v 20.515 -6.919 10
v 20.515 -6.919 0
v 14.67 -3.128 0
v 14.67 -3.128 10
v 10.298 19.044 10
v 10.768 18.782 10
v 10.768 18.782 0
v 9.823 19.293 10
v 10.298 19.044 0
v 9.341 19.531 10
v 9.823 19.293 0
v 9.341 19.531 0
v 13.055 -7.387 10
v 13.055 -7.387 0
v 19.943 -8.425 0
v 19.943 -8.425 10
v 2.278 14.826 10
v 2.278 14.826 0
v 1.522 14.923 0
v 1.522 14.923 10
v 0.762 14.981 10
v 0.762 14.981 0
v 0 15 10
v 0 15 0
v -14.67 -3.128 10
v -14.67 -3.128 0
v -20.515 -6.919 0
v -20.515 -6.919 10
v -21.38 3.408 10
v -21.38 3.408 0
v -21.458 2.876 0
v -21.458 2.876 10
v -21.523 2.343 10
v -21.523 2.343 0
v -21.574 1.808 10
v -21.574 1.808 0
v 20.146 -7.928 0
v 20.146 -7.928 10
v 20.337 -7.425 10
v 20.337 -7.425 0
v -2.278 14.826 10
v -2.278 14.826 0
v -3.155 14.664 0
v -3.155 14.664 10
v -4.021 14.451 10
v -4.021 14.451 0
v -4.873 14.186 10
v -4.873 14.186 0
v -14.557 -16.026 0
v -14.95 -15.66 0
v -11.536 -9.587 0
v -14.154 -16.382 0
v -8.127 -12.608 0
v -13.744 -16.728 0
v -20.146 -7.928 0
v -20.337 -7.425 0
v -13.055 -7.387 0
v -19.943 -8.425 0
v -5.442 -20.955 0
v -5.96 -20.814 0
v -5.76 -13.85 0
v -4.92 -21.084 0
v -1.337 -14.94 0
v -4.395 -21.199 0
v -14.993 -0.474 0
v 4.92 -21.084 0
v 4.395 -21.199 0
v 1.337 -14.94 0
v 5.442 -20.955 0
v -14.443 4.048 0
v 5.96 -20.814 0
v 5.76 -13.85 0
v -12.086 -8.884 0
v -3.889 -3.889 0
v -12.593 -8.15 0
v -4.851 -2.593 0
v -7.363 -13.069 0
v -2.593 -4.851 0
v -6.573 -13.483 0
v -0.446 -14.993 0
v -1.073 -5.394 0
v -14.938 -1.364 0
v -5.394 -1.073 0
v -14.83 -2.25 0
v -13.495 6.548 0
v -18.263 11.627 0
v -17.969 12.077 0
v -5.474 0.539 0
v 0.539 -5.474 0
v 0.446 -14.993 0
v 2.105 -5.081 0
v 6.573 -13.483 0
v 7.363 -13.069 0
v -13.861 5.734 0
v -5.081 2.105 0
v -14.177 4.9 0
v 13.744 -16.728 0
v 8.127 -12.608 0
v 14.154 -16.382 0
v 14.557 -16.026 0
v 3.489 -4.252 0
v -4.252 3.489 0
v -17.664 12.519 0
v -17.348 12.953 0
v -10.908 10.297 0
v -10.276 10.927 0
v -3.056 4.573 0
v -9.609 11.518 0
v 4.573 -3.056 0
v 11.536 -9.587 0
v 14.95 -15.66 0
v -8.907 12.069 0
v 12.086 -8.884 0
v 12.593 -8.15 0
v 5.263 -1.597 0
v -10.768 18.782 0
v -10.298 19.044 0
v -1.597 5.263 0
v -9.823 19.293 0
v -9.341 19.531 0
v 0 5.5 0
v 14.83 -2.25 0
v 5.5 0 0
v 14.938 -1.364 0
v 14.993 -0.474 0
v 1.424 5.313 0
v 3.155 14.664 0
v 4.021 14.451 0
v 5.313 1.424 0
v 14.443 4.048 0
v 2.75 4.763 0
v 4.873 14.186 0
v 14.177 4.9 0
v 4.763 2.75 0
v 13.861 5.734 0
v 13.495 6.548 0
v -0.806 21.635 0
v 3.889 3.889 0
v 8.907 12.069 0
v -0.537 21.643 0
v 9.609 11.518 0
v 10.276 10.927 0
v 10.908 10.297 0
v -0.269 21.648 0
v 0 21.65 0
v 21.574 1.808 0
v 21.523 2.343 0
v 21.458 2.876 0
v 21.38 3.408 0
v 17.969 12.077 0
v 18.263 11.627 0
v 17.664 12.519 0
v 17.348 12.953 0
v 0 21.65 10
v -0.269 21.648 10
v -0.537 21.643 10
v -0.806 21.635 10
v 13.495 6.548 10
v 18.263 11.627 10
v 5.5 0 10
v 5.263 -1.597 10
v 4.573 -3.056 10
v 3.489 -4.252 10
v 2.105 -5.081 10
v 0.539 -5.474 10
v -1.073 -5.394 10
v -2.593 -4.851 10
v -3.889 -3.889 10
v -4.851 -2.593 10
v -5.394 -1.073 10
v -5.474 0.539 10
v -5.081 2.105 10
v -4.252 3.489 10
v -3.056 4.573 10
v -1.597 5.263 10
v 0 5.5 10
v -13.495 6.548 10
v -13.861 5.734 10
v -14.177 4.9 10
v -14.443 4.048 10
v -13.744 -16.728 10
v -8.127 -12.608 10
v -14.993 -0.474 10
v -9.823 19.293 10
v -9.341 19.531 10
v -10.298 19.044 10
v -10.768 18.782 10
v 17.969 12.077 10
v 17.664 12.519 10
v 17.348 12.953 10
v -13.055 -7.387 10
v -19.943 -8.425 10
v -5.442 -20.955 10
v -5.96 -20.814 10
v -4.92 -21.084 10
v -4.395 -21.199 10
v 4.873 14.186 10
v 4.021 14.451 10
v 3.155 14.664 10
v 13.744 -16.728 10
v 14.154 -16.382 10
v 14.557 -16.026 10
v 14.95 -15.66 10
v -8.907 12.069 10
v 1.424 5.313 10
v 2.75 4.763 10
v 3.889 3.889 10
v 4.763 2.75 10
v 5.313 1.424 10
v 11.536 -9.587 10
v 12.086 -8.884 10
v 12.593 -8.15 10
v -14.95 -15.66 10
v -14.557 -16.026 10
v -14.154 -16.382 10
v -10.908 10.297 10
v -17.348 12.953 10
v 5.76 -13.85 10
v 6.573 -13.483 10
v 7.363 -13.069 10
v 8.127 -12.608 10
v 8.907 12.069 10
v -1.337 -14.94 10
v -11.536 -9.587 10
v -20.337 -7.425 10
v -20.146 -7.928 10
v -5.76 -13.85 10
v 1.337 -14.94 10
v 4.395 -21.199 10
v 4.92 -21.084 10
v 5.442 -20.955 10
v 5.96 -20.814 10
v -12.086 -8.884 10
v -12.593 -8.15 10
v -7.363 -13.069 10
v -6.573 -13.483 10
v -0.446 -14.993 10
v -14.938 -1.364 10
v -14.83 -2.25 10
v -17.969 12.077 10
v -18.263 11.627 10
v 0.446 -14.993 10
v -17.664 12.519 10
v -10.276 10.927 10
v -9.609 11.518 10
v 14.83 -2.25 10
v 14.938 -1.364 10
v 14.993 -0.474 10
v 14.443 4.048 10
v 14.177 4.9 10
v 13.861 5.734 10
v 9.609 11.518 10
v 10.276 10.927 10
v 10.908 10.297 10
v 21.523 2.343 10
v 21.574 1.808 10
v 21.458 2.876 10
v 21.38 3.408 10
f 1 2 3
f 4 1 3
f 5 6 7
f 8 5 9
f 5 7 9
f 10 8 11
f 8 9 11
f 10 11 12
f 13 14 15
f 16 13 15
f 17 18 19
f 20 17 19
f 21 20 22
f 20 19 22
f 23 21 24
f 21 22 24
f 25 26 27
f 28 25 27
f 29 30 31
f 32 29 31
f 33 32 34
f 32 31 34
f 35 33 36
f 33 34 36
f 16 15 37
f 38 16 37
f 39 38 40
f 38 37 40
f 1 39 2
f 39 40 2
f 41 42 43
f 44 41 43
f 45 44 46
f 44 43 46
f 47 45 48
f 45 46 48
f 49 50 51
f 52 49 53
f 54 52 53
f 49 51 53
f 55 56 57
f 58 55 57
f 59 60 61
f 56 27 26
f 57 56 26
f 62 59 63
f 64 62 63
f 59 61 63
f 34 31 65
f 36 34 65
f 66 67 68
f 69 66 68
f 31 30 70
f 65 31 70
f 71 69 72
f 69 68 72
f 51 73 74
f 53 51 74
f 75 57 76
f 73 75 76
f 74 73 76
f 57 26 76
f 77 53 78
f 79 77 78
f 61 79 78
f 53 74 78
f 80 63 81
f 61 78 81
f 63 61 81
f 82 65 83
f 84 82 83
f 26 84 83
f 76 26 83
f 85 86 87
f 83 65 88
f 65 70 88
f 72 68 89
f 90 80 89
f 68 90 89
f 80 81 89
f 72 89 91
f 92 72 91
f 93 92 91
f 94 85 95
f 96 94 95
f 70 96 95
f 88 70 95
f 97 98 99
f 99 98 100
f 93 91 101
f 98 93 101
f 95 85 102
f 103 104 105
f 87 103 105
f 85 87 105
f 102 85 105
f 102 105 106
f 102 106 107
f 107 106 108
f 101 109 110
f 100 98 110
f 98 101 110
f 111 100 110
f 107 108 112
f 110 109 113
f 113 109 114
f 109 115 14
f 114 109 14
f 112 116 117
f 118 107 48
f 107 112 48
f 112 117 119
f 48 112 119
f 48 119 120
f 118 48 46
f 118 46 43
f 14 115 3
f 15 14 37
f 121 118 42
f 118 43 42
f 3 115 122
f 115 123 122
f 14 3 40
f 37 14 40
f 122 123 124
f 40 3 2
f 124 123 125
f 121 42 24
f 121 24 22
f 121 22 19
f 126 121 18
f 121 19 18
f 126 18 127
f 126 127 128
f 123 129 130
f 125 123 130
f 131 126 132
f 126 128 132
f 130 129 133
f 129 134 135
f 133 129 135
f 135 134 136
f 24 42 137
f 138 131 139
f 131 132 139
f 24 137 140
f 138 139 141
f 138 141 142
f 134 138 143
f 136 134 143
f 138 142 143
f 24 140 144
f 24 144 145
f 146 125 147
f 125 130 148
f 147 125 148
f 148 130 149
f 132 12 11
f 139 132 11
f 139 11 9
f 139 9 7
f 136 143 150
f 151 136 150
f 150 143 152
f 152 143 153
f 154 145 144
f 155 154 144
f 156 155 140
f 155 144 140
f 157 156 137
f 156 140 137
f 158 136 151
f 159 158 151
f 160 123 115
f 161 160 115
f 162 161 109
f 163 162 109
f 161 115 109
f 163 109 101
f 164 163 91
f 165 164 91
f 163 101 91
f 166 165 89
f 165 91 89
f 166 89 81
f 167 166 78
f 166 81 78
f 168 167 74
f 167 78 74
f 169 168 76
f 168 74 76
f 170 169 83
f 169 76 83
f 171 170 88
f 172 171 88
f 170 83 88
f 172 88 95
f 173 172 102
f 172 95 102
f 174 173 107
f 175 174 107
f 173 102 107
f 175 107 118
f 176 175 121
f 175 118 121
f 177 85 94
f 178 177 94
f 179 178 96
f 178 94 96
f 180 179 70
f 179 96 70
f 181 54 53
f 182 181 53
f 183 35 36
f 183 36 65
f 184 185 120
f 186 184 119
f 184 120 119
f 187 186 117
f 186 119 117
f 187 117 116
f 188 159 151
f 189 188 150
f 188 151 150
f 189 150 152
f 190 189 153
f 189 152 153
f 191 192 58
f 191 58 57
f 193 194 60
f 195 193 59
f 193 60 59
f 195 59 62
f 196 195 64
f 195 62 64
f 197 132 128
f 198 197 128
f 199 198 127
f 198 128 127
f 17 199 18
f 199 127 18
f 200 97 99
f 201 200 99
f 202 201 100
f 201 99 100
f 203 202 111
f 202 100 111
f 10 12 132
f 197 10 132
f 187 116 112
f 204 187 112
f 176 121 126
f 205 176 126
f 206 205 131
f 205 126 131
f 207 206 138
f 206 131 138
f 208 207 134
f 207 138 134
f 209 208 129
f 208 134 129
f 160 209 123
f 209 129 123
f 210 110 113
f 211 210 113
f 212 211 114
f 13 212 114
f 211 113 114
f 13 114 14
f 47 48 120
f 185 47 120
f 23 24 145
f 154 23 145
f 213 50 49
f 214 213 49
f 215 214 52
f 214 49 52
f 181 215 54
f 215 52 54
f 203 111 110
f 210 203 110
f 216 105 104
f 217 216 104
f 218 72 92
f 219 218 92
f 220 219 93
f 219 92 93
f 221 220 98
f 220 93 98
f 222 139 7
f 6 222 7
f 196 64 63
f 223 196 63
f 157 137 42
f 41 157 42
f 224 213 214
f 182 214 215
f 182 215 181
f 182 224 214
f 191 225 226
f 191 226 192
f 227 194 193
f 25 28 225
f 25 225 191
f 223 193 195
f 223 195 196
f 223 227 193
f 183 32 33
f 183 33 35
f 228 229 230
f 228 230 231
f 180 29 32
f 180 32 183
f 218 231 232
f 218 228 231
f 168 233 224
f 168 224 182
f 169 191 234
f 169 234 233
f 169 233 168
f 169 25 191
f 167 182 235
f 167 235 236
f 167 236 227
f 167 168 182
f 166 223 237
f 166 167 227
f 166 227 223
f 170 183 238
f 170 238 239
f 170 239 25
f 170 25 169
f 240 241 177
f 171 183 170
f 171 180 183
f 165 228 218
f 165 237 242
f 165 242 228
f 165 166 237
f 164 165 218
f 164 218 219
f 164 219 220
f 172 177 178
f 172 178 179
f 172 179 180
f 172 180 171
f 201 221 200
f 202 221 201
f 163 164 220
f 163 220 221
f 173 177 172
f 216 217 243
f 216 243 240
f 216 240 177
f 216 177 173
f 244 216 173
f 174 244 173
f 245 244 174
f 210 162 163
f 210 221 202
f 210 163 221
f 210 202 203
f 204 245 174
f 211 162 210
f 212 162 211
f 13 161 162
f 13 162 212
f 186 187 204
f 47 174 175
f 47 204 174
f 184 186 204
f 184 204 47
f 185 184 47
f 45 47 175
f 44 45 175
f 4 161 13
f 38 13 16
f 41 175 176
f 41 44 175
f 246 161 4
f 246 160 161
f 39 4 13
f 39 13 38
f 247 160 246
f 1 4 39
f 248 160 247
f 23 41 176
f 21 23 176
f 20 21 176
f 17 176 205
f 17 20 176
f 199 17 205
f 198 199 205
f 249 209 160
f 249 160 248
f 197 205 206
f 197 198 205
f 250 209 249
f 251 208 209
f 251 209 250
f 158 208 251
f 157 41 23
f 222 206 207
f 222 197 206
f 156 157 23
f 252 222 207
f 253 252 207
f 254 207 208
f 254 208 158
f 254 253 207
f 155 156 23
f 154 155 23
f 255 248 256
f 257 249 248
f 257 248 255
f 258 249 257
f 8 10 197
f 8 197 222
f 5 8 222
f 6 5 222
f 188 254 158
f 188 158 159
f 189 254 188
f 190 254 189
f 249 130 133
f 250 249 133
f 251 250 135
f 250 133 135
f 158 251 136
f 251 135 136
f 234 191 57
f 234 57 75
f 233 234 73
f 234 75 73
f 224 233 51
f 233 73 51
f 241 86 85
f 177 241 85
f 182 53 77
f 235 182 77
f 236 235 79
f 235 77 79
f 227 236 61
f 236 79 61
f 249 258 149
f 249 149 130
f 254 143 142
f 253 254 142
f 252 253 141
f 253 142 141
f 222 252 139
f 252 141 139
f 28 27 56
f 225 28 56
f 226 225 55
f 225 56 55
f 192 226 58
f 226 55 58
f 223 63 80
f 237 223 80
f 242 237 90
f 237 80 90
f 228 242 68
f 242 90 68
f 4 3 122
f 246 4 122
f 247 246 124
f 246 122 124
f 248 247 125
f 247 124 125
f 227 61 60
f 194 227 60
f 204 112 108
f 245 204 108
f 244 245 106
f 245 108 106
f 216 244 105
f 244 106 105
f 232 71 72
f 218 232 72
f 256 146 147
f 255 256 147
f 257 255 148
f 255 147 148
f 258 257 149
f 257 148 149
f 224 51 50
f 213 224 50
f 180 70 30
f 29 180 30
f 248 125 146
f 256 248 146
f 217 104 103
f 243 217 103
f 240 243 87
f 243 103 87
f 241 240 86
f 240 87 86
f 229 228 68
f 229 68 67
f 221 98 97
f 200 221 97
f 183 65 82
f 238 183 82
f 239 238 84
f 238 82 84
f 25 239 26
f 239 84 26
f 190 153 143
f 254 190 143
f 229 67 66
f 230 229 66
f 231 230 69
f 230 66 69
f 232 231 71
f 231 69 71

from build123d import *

# Parameters (mm, degrees)
BOSS_EXTRUDE1_DEPTH = 10


with BuildPart() as part:
    # Sketch1 → Boss-Extrude1 (new body)
    with BuildSketch(Plane.XY):
        with BuildLine():
            Line((0, 15), (0, 21.65))
            ThreePointArc((0, 21.65), (-0.40286299, 21.64625144), (-0.805586474, 21.635007059))
            Line((-0.805586474, 21.635007059), (-2.277654316, 14.826067949))
            ThreePointArc((-2.277654316, 14.826067949), (-3.589734964, 14.564127261), (-4.873254588, 14.18630994))
            Line((-4.873254588, 14.18630994), (-9.34097771, 19.531222067))
            ThreePointArc((-9.34097771, 19.531222067), (-10.061256675, 19.170122955), (-10.767600505, 18.782472664))
            Line((-10.767600505, 18.782472664), (-8.906780064, 12.069352464))
            ThreePointArc((-8.906780064, 12.069352464), (-9.946839874, 11.227661223), (-10.907759595, 10.296639288))
            Line((-10.907759595, 10.296639288), (-17.347636471, 12.953069476))
            ThreePointArc((-17.347636471, 12.953069476), (-17.817600697, 12.298601767), (-18.262887024, 11.627100134))
            Line((-18.262887024, 11.627100134), (-13.495469838, 6.547693781))
            ThreePointArc((-13.495469838, 6.547693781), (-14.02524364, 5.319073306), (-14.443428331, 4.048132663))
            Line((-14.443428331, 4.048132663), (-21.380160779, 3.40752477))
            ThreePointArc((-21.380160779, 3.40752477), (-21.492147124, 2.609619128), (-21.574366218, 1.808099086))
            Line((-21.574366218, 1.808099086), (-14.992510111, -0.473962639))
            ThreePointArc((-14.992510111, -0.473962639), (-14.890633111, -1.808050204), (-14.670281698, -3.12775237))
            Line((-14.670281698, -3.12775237), (-20.514747911, -6.918642796))
            ThreePointArc((-20.514747911, -6.918642796), (-20.243101654, -7.677195804), (-19.94341811, -8.425115673))
            Line((-19.94341811, -8.425115673), (-13.054946996, -7.38703993))
            ThreePointArc((-13.054946996, -7.38703993), (-12.344757988, -8.520971201), (-11.536350325, -9.587107028))
            Line((-11.536350325, -9.587107028), (-14.949653526, -15.659832676))
            ThreePointArc((-14.949653526, -15.659832676), (-14.356605551, -16.205257698), (-13.743673257, -16.728237964))
            Line((-13.743673257, -16.728237964), (-8.126652854, -12.607835397))
            ThreePointArc((-8.126652854, -12.607835397), (-6.970847581, -13.281840385), (-5.75958012, -13.850171004))
            Line((-5.75958012, -13.850171004), (-5.959773682, -20.813543611))
            ThreePointArc((-5.959773682, -20.813543611), (-5.181184132, -21.020890347), (-4.395418491, -21.199122536))
            Line((-4.395418491, -21.199122536), (-1.336640479, -14.940327715))
            ThreePointArc((-1.336640479, -14.940327715), (0, -15), (1.336640479, -14.940327715))
            Line((1.336640479, -14.940327715), (4.395418491, -21.199122536))
            ThreePointArc((4.395418491, -21.199122536), (5.181184132, -21.020890347), (5.959773682, -20.813543611))
            Line((5.959773682, -20.813543611), (5.75958012, -13.850171004))
            ThreePointArc((5.75958012, -13.850171004), (6.970847581, -13.281840385), (8.126652854, -12.607835397))
            Line((8.126652854, -12.607835397), (13.743673257, -16.728237964))
            ThreePointArc((13.743673257, -16.728237964), (14.356605551, -16.205257698), (14.949653526, -15.659832676))
            Line((14.949653526, -15.659832676), (11.536350325, -9.587107028))
            ThreePointArc((11.536350325, -9.587107028), (12.344757988, -8.520971201), (13.054946996, -7.38703993))
            Line((13.054946996, -7.38703993), (19.94341811, -8.425115673))
            ThreePointArc((19.94341811, -8.425115673), (20.243101654, -7.677195804), (20.514747911, -6.918642796))
            Line((20.514747911, -6.918642796), (14.670281698, -3.12775237))
            ThreePointArc((14.670281698, -3.12775237), (14.890633111, -1.808050204), (14.992510111, -0.473962639))
            Line((14.992510111, -0.473962639), (21.574366218, 1.808099086))
            ThreePointArc((21.574366218, 1.808099086), (21.492147124, 2.609619128), (21.380160779, 3.40752477))
            Line((21.380160779, 3.40752477), (14.443428331, 4.048132663))
            ThreePointArc((14.443428331, 4.048132663), (14.02524364, 5.319073306), (13.495469838, 6.547693781))
            Line((13.495469838, 6.547693781), (18.262887024, 11.627100134))
            ThreePointArc((18.262887024, 11.627100134), (17.817600697, 12.298601767), (17.347636471, 12.953069476))
            Line((17.347636471, 12.953069476), (10.907759595, 10.296639288))
            ThreePointArc((10.907759595, 10.296639288), (9.946839874, 11.227661223), (8.906780064, 12.069352464))
            Line((8.906780064, 12.069352464), (10.767600505, 18.782472664))
            ThreePointArc((10.767600505, 18.782472664), (10.061256675, 19.170122955), (9.34097771, 19.531222067))
            Line((9.34097771, 19.531222067), (4.873254588, 14.18630994))
            ThreePointArc((4.873254588, 14.18630994), (3.589734964, 14.564127261), (2.277654316, 14.826067949))
            ThreePointArc((2.277654316, 14.826067949), (1.142142892, 14.956453778), (0, 15))
        make_face()
        with BuildLine():
            ThreePointArc((5.5, 0), (-3.889087297, -3.889087297), (0, 5.5))
            ThreePointArc((0, 5.5), (3.889087297, 3.889087297), (5.5, 0))
        make_face(mode=Mode.SUBTRACT)
    extrude(amount=BOSS_EXTRUDE1_DEPTH)


solid = part.part
